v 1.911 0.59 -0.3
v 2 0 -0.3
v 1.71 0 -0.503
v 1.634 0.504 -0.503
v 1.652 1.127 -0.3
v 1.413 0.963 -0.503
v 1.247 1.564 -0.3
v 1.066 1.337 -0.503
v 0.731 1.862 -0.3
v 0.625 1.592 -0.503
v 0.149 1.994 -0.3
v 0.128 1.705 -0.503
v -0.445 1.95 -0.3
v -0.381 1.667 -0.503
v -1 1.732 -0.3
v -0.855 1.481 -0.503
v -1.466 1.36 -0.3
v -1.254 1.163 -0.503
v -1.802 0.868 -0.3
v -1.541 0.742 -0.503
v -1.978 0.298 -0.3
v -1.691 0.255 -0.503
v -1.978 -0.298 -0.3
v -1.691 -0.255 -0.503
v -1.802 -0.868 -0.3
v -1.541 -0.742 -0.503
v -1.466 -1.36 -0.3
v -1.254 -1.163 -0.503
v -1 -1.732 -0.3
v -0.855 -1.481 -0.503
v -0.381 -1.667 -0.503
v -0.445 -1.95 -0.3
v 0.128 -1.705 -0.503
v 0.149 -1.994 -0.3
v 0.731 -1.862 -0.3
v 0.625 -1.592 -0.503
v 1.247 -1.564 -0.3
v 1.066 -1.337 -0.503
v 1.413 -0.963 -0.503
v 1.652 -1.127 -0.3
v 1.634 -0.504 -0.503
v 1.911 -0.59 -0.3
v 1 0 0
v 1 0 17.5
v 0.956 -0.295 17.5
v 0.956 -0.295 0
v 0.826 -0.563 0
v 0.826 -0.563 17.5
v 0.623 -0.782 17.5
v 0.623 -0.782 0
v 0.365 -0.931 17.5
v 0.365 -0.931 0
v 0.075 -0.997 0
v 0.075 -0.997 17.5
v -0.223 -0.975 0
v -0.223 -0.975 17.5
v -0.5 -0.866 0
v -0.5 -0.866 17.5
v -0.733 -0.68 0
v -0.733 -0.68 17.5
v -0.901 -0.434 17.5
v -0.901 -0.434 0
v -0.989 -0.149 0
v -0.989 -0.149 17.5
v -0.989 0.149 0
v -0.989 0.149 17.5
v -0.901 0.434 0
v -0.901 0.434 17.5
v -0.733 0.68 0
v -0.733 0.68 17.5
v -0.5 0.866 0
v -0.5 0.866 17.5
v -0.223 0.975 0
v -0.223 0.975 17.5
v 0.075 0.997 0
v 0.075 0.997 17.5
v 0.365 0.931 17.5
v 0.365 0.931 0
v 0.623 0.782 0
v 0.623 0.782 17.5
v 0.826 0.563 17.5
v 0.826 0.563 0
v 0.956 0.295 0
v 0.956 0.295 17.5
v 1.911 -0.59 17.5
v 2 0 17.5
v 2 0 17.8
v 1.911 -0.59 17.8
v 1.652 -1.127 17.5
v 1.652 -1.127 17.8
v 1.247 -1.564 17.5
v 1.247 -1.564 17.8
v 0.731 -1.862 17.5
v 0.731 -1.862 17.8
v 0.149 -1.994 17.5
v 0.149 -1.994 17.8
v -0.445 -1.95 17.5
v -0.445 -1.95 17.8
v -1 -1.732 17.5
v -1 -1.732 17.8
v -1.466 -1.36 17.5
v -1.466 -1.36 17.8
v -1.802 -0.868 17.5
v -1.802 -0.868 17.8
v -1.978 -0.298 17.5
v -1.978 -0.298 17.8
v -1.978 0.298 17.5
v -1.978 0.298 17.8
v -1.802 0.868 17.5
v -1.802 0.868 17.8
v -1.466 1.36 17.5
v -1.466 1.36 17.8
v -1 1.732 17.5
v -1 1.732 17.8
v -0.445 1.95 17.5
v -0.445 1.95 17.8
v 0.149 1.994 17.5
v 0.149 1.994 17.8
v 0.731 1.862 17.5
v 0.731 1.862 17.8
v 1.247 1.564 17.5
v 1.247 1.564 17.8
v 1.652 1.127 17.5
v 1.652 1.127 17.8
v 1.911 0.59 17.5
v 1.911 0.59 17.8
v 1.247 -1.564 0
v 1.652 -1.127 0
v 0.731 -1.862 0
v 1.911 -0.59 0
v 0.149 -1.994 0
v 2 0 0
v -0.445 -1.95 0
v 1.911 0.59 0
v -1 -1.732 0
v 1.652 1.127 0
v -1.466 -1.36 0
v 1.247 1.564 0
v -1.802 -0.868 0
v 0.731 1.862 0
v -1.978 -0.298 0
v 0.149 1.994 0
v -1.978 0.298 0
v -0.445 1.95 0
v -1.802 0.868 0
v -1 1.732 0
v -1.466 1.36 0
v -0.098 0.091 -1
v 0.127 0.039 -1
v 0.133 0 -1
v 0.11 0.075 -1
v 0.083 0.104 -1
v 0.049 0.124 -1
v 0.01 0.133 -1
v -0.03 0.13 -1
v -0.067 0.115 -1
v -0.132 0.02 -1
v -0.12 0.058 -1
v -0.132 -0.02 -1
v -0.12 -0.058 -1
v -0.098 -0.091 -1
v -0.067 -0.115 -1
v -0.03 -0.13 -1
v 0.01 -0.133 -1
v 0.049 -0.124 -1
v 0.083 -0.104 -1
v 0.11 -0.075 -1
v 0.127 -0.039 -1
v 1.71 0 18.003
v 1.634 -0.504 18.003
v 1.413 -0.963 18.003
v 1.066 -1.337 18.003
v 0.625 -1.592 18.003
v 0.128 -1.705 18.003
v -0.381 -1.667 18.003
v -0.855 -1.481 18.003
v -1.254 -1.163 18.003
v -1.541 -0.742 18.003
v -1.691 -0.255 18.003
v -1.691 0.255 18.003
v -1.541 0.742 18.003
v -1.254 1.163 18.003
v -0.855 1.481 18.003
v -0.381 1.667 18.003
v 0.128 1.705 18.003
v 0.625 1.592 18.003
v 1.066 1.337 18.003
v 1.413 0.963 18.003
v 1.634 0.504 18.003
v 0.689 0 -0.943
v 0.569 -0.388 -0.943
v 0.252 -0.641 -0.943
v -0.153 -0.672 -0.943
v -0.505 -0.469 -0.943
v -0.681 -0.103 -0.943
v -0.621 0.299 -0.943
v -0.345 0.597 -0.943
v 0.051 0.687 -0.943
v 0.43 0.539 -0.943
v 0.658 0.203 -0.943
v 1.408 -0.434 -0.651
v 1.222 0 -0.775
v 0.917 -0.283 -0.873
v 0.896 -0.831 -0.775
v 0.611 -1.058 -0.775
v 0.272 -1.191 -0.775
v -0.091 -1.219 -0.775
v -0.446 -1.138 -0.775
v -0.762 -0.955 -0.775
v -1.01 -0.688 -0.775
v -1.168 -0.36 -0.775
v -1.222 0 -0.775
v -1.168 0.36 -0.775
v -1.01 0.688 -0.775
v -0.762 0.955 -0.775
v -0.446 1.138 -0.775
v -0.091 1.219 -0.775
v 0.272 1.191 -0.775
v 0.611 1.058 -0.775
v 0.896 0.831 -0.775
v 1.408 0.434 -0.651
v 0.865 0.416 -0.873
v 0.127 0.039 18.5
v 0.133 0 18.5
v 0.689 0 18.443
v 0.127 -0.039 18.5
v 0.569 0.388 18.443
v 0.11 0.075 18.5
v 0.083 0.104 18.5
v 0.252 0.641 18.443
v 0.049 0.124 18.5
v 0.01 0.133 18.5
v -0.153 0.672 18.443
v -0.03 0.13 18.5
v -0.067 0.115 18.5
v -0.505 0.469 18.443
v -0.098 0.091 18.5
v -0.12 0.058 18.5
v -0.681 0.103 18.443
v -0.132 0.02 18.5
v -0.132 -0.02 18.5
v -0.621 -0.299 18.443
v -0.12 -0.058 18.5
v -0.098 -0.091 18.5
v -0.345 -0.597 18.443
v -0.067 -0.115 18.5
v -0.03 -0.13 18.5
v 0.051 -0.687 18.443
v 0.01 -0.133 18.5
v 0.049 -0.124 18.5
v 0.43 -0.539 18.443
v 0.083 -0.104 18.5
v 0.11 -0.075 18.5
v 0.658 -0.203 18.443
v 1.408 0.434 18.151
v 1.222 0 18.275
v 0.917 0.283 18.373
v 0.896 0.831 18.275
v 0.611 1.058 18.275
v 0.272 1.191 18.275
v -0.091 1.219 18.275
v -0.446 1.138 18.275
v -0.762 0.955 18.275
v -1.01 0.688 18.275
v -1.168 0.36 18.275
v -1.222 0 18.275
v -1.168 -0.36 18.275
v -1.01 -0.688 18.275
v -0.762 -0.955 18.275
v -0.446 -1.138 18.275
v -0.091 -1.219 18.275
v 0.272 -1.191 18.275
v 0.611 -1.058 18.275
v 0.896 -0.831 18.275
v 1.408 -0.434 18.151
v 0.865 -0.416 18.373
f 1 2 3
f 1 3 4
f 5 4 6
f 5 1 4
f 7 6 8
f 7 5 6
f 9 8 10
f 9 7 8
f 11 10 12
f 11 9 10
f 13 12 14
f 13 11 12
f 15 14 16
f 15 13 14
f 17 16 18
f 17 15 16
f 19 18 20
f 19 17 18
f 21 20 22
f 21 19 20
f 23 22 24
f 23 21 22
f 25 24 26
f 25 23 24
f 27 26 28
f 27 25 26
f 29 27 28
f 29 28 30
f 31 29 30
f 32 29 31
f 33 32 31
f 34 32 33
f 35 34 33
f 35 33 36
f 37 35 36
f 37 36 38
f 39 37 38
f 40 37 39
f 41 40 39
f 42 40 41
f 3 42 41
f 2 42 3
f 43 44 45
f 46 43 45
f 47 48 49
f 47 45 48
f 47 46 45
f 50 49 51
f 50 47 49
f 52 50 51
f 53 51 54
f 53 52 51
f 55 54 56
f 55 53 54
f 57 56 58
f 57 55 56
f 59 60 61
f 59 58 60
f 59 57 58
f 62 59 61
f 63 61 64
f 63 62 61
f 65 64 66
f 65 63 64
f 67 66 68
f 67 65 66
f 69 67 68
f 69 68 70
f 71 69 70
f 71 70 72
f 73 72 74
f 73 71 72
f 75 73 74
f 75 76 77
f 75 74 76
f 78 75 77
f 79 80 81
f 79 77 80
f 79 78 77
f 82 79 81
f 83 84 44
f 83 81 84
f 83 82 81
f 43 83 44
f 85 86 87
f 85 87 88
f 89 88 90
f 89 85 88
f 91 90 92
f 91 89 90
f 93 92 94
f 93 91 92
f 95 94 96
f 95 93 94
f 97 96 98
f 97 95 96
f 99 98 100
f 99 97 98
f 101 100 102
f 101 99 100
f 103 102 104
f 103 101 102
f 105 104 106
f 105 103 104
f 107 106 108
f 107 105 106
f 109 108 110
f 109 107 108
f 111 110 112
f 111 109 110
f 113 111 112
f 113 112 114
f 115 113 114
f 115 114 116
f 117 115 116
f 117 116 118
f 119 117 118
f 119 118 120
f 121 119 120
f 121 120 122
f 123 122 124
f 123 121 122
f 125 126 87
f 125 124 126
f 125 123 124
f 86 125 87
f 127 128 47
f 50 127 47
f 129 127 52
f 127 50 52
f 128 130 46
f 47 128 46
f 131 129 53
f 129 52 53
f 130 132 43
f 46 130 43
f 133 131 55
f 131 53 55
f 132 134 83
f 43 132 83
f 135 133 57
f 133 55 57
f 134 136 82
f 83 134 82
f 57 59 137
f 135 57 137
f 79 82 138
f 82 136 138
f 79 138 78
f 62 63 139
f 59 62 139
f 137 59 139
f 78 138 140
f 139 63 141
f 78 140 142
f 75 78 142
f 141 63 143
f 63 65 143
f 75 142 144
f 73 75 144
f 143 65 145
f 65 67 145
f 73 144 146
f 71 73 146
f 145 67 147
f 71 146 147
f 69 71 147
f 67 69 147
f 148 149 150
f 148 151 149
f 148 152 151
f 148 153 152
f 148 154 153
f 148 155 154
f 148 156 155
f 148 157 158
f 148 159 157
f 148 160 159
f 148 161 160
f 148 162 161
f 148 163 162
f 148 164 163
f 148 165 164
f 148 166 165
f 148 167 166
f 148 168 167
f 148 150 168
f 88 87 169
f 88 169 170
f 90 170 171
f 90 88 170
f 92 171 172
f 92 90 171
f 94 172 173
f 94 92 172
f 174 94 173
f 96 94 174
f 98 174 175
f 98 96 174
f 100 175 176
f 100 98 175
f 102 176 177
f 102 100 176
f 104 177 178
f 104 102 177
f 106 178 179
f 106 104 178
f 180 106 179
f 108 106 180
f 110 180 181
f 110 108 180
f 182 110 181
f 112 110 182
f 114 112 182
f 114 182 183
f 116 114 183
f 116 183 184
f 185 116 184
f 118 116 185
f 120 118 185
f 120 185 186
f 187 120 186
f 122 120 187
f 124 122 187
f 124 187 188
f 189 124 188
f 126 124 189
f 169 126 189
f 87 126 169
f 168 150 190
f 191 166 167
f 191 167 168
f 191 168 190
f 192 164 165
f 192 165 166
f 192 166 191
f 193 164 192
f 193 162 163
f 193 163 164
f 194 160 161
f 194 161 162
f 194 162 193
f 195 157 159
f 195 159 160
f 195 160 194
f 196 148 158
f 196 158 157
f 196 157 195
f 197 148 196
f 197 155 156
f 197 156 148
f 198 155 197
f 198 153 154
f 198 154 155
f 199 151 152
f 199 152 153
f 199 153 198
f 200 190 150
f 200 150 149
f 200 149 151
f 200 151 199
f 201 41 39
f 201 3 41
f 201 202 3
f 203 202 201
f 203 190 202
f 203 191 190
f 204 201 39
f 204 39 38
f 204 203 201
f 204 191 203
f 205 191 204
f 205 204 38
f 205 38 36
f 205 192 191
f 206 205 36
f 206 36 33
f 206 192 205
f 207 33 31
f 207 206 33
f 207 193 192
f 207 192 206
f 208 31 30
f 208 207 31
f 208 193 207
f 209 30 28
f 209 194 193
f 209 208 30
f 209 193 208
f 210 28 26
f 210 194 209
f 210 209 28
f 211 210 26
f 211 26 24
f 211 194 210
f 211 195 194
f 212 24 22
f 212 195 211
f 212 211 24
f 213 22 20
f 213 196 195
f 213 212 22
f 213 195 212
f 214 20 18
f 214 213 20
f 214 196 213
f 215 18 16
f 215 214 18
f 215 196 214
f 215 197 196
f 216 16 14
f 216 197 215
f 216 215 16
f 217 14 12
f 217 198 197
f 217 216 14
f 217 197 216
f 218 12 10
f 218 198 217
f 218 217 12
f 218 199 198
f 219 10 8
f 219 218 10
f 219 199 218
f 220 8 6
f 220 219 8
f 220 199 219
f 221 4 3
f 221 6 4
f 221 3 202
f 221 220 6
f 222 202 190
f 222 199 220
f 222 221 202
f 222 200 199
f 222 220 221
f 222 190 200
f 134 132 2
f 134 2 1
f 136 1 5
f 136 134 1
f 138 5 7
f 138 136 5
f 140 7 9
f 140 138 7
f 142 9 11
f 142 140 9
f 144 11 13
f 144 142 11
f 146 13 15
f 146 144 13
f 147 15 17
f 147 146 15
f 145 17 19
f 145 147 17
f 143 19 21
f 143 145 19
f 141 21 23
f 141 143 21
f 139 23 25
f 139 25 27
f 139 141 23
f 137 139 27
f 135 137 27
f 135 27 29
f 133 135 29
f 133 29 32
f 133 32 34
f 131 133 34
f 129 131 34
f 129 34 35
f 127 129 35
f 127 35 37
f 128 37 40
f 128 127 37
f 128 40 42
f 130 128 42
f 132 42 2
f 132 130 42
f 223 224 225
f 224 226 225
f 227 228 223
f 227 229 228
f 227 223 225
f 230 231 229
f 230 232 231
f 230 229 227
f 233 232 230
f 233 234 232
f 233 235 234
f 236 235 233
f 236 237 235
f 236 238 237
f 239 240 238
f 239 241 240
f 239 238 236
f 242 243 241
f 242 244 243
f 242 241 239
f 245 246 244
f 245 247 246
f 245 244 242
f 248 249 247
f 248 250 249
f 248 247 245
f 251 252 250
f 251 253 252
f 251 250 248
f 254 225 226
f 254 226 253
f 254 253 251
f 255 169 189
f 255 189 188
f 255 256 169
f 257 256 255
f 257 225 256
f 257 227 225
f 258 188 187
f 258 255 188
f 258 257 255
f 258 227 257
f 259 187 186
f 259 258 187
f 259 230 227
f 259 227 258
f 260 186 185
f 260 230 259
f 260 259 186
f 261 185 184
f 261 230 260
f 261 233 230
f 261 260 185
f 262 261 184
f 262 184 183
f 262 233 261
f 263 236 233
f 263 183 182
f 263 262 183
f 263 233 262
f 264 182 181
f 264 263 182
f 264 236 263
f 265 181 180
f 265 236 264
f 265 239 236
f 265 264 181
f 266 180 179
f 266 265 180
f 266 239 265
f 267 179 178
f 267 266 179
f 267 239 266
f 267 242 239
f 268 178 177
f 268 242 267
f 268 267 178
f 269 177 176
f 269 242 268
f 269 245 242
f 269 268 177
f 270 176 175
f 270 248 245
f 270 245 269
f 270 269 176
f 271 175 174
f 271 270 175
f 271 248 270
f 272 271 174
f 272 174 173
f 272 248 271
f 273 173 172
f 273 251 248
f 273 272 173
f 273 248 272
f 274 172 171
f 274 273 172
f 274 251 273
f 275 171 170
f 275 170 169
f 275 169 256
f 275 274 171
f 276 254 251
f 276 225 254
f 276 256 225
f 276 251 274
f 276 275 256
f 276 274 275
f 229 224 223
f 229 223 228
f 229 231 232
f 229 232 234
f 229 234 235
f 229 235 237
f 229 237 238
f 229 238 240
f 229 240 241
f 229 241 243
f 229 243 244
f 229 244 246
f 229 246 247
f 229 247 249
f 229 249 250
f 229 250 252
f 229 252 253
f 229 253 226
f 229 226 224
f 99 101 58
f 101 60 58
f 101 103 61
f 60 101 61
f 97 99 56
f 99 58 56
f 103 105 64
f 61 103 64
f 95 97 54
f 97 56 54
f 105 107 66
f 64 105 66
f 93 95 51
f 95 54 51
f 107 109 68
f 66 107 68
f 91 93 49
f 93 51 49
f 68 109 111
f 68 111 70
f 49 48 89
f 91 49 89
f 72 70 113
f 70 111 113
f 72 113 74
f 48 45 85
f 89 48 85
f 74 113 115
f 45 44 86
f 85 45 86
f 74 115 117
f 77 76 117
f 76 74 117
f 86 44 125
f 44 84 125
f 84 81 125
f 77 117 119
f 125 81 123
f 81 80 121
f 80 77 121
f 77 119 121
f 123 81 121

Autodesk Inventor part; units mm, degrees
ref_plane "YZ Plane" through (0, 0, 0) normal (1, 0, 0) x (0, 1, 0)
ref_plane "XZ Plane" through (0, 0, 0) normal (0, 1, 0) x (-1, 0, 0)
sketch "Sketch1" plane through (0, 0, 0) normal (0, 0, 1) x (1, 0, 0)
  circle A0 centre (0, 0) radius 1
  dimension "d0" = 2
extrude "Extrusion1" add sketch "Sketch1" along normal blind 17.5
sketch "Sketch2" plane through (0, 0, 17.5) normal (0, 0, 1) x (1, 0, 0)
  circle A0 centre (0, 0) radius 1 projected
  circle A1 centre (0, 0) radius 2
  dimension "d3" = 4
extrude "Extrusion2" add sketch "Sketch2" along normal blind 1 contours A0 | A1
chamfer "Chamfer1" distance 0.7 distance2 1 1 edges at (-2, 0, 18.5) measured on face at (1.9935, -0.1609, 18.1667)
fillet "Fillet1" radius 2.75 1 edges at (-1, 0, 18.5)
ref_plane "Work Plane1" through (0, 0, 8.75) normal (0, 0, -1) x (-1, 0, 0)
mirror "Mirror1" about plane through (0, 0, 8.75) normal (0, 0, -1) of "Extrusion2", "Chamfer1", "Fillet1"
properties part number "02"
